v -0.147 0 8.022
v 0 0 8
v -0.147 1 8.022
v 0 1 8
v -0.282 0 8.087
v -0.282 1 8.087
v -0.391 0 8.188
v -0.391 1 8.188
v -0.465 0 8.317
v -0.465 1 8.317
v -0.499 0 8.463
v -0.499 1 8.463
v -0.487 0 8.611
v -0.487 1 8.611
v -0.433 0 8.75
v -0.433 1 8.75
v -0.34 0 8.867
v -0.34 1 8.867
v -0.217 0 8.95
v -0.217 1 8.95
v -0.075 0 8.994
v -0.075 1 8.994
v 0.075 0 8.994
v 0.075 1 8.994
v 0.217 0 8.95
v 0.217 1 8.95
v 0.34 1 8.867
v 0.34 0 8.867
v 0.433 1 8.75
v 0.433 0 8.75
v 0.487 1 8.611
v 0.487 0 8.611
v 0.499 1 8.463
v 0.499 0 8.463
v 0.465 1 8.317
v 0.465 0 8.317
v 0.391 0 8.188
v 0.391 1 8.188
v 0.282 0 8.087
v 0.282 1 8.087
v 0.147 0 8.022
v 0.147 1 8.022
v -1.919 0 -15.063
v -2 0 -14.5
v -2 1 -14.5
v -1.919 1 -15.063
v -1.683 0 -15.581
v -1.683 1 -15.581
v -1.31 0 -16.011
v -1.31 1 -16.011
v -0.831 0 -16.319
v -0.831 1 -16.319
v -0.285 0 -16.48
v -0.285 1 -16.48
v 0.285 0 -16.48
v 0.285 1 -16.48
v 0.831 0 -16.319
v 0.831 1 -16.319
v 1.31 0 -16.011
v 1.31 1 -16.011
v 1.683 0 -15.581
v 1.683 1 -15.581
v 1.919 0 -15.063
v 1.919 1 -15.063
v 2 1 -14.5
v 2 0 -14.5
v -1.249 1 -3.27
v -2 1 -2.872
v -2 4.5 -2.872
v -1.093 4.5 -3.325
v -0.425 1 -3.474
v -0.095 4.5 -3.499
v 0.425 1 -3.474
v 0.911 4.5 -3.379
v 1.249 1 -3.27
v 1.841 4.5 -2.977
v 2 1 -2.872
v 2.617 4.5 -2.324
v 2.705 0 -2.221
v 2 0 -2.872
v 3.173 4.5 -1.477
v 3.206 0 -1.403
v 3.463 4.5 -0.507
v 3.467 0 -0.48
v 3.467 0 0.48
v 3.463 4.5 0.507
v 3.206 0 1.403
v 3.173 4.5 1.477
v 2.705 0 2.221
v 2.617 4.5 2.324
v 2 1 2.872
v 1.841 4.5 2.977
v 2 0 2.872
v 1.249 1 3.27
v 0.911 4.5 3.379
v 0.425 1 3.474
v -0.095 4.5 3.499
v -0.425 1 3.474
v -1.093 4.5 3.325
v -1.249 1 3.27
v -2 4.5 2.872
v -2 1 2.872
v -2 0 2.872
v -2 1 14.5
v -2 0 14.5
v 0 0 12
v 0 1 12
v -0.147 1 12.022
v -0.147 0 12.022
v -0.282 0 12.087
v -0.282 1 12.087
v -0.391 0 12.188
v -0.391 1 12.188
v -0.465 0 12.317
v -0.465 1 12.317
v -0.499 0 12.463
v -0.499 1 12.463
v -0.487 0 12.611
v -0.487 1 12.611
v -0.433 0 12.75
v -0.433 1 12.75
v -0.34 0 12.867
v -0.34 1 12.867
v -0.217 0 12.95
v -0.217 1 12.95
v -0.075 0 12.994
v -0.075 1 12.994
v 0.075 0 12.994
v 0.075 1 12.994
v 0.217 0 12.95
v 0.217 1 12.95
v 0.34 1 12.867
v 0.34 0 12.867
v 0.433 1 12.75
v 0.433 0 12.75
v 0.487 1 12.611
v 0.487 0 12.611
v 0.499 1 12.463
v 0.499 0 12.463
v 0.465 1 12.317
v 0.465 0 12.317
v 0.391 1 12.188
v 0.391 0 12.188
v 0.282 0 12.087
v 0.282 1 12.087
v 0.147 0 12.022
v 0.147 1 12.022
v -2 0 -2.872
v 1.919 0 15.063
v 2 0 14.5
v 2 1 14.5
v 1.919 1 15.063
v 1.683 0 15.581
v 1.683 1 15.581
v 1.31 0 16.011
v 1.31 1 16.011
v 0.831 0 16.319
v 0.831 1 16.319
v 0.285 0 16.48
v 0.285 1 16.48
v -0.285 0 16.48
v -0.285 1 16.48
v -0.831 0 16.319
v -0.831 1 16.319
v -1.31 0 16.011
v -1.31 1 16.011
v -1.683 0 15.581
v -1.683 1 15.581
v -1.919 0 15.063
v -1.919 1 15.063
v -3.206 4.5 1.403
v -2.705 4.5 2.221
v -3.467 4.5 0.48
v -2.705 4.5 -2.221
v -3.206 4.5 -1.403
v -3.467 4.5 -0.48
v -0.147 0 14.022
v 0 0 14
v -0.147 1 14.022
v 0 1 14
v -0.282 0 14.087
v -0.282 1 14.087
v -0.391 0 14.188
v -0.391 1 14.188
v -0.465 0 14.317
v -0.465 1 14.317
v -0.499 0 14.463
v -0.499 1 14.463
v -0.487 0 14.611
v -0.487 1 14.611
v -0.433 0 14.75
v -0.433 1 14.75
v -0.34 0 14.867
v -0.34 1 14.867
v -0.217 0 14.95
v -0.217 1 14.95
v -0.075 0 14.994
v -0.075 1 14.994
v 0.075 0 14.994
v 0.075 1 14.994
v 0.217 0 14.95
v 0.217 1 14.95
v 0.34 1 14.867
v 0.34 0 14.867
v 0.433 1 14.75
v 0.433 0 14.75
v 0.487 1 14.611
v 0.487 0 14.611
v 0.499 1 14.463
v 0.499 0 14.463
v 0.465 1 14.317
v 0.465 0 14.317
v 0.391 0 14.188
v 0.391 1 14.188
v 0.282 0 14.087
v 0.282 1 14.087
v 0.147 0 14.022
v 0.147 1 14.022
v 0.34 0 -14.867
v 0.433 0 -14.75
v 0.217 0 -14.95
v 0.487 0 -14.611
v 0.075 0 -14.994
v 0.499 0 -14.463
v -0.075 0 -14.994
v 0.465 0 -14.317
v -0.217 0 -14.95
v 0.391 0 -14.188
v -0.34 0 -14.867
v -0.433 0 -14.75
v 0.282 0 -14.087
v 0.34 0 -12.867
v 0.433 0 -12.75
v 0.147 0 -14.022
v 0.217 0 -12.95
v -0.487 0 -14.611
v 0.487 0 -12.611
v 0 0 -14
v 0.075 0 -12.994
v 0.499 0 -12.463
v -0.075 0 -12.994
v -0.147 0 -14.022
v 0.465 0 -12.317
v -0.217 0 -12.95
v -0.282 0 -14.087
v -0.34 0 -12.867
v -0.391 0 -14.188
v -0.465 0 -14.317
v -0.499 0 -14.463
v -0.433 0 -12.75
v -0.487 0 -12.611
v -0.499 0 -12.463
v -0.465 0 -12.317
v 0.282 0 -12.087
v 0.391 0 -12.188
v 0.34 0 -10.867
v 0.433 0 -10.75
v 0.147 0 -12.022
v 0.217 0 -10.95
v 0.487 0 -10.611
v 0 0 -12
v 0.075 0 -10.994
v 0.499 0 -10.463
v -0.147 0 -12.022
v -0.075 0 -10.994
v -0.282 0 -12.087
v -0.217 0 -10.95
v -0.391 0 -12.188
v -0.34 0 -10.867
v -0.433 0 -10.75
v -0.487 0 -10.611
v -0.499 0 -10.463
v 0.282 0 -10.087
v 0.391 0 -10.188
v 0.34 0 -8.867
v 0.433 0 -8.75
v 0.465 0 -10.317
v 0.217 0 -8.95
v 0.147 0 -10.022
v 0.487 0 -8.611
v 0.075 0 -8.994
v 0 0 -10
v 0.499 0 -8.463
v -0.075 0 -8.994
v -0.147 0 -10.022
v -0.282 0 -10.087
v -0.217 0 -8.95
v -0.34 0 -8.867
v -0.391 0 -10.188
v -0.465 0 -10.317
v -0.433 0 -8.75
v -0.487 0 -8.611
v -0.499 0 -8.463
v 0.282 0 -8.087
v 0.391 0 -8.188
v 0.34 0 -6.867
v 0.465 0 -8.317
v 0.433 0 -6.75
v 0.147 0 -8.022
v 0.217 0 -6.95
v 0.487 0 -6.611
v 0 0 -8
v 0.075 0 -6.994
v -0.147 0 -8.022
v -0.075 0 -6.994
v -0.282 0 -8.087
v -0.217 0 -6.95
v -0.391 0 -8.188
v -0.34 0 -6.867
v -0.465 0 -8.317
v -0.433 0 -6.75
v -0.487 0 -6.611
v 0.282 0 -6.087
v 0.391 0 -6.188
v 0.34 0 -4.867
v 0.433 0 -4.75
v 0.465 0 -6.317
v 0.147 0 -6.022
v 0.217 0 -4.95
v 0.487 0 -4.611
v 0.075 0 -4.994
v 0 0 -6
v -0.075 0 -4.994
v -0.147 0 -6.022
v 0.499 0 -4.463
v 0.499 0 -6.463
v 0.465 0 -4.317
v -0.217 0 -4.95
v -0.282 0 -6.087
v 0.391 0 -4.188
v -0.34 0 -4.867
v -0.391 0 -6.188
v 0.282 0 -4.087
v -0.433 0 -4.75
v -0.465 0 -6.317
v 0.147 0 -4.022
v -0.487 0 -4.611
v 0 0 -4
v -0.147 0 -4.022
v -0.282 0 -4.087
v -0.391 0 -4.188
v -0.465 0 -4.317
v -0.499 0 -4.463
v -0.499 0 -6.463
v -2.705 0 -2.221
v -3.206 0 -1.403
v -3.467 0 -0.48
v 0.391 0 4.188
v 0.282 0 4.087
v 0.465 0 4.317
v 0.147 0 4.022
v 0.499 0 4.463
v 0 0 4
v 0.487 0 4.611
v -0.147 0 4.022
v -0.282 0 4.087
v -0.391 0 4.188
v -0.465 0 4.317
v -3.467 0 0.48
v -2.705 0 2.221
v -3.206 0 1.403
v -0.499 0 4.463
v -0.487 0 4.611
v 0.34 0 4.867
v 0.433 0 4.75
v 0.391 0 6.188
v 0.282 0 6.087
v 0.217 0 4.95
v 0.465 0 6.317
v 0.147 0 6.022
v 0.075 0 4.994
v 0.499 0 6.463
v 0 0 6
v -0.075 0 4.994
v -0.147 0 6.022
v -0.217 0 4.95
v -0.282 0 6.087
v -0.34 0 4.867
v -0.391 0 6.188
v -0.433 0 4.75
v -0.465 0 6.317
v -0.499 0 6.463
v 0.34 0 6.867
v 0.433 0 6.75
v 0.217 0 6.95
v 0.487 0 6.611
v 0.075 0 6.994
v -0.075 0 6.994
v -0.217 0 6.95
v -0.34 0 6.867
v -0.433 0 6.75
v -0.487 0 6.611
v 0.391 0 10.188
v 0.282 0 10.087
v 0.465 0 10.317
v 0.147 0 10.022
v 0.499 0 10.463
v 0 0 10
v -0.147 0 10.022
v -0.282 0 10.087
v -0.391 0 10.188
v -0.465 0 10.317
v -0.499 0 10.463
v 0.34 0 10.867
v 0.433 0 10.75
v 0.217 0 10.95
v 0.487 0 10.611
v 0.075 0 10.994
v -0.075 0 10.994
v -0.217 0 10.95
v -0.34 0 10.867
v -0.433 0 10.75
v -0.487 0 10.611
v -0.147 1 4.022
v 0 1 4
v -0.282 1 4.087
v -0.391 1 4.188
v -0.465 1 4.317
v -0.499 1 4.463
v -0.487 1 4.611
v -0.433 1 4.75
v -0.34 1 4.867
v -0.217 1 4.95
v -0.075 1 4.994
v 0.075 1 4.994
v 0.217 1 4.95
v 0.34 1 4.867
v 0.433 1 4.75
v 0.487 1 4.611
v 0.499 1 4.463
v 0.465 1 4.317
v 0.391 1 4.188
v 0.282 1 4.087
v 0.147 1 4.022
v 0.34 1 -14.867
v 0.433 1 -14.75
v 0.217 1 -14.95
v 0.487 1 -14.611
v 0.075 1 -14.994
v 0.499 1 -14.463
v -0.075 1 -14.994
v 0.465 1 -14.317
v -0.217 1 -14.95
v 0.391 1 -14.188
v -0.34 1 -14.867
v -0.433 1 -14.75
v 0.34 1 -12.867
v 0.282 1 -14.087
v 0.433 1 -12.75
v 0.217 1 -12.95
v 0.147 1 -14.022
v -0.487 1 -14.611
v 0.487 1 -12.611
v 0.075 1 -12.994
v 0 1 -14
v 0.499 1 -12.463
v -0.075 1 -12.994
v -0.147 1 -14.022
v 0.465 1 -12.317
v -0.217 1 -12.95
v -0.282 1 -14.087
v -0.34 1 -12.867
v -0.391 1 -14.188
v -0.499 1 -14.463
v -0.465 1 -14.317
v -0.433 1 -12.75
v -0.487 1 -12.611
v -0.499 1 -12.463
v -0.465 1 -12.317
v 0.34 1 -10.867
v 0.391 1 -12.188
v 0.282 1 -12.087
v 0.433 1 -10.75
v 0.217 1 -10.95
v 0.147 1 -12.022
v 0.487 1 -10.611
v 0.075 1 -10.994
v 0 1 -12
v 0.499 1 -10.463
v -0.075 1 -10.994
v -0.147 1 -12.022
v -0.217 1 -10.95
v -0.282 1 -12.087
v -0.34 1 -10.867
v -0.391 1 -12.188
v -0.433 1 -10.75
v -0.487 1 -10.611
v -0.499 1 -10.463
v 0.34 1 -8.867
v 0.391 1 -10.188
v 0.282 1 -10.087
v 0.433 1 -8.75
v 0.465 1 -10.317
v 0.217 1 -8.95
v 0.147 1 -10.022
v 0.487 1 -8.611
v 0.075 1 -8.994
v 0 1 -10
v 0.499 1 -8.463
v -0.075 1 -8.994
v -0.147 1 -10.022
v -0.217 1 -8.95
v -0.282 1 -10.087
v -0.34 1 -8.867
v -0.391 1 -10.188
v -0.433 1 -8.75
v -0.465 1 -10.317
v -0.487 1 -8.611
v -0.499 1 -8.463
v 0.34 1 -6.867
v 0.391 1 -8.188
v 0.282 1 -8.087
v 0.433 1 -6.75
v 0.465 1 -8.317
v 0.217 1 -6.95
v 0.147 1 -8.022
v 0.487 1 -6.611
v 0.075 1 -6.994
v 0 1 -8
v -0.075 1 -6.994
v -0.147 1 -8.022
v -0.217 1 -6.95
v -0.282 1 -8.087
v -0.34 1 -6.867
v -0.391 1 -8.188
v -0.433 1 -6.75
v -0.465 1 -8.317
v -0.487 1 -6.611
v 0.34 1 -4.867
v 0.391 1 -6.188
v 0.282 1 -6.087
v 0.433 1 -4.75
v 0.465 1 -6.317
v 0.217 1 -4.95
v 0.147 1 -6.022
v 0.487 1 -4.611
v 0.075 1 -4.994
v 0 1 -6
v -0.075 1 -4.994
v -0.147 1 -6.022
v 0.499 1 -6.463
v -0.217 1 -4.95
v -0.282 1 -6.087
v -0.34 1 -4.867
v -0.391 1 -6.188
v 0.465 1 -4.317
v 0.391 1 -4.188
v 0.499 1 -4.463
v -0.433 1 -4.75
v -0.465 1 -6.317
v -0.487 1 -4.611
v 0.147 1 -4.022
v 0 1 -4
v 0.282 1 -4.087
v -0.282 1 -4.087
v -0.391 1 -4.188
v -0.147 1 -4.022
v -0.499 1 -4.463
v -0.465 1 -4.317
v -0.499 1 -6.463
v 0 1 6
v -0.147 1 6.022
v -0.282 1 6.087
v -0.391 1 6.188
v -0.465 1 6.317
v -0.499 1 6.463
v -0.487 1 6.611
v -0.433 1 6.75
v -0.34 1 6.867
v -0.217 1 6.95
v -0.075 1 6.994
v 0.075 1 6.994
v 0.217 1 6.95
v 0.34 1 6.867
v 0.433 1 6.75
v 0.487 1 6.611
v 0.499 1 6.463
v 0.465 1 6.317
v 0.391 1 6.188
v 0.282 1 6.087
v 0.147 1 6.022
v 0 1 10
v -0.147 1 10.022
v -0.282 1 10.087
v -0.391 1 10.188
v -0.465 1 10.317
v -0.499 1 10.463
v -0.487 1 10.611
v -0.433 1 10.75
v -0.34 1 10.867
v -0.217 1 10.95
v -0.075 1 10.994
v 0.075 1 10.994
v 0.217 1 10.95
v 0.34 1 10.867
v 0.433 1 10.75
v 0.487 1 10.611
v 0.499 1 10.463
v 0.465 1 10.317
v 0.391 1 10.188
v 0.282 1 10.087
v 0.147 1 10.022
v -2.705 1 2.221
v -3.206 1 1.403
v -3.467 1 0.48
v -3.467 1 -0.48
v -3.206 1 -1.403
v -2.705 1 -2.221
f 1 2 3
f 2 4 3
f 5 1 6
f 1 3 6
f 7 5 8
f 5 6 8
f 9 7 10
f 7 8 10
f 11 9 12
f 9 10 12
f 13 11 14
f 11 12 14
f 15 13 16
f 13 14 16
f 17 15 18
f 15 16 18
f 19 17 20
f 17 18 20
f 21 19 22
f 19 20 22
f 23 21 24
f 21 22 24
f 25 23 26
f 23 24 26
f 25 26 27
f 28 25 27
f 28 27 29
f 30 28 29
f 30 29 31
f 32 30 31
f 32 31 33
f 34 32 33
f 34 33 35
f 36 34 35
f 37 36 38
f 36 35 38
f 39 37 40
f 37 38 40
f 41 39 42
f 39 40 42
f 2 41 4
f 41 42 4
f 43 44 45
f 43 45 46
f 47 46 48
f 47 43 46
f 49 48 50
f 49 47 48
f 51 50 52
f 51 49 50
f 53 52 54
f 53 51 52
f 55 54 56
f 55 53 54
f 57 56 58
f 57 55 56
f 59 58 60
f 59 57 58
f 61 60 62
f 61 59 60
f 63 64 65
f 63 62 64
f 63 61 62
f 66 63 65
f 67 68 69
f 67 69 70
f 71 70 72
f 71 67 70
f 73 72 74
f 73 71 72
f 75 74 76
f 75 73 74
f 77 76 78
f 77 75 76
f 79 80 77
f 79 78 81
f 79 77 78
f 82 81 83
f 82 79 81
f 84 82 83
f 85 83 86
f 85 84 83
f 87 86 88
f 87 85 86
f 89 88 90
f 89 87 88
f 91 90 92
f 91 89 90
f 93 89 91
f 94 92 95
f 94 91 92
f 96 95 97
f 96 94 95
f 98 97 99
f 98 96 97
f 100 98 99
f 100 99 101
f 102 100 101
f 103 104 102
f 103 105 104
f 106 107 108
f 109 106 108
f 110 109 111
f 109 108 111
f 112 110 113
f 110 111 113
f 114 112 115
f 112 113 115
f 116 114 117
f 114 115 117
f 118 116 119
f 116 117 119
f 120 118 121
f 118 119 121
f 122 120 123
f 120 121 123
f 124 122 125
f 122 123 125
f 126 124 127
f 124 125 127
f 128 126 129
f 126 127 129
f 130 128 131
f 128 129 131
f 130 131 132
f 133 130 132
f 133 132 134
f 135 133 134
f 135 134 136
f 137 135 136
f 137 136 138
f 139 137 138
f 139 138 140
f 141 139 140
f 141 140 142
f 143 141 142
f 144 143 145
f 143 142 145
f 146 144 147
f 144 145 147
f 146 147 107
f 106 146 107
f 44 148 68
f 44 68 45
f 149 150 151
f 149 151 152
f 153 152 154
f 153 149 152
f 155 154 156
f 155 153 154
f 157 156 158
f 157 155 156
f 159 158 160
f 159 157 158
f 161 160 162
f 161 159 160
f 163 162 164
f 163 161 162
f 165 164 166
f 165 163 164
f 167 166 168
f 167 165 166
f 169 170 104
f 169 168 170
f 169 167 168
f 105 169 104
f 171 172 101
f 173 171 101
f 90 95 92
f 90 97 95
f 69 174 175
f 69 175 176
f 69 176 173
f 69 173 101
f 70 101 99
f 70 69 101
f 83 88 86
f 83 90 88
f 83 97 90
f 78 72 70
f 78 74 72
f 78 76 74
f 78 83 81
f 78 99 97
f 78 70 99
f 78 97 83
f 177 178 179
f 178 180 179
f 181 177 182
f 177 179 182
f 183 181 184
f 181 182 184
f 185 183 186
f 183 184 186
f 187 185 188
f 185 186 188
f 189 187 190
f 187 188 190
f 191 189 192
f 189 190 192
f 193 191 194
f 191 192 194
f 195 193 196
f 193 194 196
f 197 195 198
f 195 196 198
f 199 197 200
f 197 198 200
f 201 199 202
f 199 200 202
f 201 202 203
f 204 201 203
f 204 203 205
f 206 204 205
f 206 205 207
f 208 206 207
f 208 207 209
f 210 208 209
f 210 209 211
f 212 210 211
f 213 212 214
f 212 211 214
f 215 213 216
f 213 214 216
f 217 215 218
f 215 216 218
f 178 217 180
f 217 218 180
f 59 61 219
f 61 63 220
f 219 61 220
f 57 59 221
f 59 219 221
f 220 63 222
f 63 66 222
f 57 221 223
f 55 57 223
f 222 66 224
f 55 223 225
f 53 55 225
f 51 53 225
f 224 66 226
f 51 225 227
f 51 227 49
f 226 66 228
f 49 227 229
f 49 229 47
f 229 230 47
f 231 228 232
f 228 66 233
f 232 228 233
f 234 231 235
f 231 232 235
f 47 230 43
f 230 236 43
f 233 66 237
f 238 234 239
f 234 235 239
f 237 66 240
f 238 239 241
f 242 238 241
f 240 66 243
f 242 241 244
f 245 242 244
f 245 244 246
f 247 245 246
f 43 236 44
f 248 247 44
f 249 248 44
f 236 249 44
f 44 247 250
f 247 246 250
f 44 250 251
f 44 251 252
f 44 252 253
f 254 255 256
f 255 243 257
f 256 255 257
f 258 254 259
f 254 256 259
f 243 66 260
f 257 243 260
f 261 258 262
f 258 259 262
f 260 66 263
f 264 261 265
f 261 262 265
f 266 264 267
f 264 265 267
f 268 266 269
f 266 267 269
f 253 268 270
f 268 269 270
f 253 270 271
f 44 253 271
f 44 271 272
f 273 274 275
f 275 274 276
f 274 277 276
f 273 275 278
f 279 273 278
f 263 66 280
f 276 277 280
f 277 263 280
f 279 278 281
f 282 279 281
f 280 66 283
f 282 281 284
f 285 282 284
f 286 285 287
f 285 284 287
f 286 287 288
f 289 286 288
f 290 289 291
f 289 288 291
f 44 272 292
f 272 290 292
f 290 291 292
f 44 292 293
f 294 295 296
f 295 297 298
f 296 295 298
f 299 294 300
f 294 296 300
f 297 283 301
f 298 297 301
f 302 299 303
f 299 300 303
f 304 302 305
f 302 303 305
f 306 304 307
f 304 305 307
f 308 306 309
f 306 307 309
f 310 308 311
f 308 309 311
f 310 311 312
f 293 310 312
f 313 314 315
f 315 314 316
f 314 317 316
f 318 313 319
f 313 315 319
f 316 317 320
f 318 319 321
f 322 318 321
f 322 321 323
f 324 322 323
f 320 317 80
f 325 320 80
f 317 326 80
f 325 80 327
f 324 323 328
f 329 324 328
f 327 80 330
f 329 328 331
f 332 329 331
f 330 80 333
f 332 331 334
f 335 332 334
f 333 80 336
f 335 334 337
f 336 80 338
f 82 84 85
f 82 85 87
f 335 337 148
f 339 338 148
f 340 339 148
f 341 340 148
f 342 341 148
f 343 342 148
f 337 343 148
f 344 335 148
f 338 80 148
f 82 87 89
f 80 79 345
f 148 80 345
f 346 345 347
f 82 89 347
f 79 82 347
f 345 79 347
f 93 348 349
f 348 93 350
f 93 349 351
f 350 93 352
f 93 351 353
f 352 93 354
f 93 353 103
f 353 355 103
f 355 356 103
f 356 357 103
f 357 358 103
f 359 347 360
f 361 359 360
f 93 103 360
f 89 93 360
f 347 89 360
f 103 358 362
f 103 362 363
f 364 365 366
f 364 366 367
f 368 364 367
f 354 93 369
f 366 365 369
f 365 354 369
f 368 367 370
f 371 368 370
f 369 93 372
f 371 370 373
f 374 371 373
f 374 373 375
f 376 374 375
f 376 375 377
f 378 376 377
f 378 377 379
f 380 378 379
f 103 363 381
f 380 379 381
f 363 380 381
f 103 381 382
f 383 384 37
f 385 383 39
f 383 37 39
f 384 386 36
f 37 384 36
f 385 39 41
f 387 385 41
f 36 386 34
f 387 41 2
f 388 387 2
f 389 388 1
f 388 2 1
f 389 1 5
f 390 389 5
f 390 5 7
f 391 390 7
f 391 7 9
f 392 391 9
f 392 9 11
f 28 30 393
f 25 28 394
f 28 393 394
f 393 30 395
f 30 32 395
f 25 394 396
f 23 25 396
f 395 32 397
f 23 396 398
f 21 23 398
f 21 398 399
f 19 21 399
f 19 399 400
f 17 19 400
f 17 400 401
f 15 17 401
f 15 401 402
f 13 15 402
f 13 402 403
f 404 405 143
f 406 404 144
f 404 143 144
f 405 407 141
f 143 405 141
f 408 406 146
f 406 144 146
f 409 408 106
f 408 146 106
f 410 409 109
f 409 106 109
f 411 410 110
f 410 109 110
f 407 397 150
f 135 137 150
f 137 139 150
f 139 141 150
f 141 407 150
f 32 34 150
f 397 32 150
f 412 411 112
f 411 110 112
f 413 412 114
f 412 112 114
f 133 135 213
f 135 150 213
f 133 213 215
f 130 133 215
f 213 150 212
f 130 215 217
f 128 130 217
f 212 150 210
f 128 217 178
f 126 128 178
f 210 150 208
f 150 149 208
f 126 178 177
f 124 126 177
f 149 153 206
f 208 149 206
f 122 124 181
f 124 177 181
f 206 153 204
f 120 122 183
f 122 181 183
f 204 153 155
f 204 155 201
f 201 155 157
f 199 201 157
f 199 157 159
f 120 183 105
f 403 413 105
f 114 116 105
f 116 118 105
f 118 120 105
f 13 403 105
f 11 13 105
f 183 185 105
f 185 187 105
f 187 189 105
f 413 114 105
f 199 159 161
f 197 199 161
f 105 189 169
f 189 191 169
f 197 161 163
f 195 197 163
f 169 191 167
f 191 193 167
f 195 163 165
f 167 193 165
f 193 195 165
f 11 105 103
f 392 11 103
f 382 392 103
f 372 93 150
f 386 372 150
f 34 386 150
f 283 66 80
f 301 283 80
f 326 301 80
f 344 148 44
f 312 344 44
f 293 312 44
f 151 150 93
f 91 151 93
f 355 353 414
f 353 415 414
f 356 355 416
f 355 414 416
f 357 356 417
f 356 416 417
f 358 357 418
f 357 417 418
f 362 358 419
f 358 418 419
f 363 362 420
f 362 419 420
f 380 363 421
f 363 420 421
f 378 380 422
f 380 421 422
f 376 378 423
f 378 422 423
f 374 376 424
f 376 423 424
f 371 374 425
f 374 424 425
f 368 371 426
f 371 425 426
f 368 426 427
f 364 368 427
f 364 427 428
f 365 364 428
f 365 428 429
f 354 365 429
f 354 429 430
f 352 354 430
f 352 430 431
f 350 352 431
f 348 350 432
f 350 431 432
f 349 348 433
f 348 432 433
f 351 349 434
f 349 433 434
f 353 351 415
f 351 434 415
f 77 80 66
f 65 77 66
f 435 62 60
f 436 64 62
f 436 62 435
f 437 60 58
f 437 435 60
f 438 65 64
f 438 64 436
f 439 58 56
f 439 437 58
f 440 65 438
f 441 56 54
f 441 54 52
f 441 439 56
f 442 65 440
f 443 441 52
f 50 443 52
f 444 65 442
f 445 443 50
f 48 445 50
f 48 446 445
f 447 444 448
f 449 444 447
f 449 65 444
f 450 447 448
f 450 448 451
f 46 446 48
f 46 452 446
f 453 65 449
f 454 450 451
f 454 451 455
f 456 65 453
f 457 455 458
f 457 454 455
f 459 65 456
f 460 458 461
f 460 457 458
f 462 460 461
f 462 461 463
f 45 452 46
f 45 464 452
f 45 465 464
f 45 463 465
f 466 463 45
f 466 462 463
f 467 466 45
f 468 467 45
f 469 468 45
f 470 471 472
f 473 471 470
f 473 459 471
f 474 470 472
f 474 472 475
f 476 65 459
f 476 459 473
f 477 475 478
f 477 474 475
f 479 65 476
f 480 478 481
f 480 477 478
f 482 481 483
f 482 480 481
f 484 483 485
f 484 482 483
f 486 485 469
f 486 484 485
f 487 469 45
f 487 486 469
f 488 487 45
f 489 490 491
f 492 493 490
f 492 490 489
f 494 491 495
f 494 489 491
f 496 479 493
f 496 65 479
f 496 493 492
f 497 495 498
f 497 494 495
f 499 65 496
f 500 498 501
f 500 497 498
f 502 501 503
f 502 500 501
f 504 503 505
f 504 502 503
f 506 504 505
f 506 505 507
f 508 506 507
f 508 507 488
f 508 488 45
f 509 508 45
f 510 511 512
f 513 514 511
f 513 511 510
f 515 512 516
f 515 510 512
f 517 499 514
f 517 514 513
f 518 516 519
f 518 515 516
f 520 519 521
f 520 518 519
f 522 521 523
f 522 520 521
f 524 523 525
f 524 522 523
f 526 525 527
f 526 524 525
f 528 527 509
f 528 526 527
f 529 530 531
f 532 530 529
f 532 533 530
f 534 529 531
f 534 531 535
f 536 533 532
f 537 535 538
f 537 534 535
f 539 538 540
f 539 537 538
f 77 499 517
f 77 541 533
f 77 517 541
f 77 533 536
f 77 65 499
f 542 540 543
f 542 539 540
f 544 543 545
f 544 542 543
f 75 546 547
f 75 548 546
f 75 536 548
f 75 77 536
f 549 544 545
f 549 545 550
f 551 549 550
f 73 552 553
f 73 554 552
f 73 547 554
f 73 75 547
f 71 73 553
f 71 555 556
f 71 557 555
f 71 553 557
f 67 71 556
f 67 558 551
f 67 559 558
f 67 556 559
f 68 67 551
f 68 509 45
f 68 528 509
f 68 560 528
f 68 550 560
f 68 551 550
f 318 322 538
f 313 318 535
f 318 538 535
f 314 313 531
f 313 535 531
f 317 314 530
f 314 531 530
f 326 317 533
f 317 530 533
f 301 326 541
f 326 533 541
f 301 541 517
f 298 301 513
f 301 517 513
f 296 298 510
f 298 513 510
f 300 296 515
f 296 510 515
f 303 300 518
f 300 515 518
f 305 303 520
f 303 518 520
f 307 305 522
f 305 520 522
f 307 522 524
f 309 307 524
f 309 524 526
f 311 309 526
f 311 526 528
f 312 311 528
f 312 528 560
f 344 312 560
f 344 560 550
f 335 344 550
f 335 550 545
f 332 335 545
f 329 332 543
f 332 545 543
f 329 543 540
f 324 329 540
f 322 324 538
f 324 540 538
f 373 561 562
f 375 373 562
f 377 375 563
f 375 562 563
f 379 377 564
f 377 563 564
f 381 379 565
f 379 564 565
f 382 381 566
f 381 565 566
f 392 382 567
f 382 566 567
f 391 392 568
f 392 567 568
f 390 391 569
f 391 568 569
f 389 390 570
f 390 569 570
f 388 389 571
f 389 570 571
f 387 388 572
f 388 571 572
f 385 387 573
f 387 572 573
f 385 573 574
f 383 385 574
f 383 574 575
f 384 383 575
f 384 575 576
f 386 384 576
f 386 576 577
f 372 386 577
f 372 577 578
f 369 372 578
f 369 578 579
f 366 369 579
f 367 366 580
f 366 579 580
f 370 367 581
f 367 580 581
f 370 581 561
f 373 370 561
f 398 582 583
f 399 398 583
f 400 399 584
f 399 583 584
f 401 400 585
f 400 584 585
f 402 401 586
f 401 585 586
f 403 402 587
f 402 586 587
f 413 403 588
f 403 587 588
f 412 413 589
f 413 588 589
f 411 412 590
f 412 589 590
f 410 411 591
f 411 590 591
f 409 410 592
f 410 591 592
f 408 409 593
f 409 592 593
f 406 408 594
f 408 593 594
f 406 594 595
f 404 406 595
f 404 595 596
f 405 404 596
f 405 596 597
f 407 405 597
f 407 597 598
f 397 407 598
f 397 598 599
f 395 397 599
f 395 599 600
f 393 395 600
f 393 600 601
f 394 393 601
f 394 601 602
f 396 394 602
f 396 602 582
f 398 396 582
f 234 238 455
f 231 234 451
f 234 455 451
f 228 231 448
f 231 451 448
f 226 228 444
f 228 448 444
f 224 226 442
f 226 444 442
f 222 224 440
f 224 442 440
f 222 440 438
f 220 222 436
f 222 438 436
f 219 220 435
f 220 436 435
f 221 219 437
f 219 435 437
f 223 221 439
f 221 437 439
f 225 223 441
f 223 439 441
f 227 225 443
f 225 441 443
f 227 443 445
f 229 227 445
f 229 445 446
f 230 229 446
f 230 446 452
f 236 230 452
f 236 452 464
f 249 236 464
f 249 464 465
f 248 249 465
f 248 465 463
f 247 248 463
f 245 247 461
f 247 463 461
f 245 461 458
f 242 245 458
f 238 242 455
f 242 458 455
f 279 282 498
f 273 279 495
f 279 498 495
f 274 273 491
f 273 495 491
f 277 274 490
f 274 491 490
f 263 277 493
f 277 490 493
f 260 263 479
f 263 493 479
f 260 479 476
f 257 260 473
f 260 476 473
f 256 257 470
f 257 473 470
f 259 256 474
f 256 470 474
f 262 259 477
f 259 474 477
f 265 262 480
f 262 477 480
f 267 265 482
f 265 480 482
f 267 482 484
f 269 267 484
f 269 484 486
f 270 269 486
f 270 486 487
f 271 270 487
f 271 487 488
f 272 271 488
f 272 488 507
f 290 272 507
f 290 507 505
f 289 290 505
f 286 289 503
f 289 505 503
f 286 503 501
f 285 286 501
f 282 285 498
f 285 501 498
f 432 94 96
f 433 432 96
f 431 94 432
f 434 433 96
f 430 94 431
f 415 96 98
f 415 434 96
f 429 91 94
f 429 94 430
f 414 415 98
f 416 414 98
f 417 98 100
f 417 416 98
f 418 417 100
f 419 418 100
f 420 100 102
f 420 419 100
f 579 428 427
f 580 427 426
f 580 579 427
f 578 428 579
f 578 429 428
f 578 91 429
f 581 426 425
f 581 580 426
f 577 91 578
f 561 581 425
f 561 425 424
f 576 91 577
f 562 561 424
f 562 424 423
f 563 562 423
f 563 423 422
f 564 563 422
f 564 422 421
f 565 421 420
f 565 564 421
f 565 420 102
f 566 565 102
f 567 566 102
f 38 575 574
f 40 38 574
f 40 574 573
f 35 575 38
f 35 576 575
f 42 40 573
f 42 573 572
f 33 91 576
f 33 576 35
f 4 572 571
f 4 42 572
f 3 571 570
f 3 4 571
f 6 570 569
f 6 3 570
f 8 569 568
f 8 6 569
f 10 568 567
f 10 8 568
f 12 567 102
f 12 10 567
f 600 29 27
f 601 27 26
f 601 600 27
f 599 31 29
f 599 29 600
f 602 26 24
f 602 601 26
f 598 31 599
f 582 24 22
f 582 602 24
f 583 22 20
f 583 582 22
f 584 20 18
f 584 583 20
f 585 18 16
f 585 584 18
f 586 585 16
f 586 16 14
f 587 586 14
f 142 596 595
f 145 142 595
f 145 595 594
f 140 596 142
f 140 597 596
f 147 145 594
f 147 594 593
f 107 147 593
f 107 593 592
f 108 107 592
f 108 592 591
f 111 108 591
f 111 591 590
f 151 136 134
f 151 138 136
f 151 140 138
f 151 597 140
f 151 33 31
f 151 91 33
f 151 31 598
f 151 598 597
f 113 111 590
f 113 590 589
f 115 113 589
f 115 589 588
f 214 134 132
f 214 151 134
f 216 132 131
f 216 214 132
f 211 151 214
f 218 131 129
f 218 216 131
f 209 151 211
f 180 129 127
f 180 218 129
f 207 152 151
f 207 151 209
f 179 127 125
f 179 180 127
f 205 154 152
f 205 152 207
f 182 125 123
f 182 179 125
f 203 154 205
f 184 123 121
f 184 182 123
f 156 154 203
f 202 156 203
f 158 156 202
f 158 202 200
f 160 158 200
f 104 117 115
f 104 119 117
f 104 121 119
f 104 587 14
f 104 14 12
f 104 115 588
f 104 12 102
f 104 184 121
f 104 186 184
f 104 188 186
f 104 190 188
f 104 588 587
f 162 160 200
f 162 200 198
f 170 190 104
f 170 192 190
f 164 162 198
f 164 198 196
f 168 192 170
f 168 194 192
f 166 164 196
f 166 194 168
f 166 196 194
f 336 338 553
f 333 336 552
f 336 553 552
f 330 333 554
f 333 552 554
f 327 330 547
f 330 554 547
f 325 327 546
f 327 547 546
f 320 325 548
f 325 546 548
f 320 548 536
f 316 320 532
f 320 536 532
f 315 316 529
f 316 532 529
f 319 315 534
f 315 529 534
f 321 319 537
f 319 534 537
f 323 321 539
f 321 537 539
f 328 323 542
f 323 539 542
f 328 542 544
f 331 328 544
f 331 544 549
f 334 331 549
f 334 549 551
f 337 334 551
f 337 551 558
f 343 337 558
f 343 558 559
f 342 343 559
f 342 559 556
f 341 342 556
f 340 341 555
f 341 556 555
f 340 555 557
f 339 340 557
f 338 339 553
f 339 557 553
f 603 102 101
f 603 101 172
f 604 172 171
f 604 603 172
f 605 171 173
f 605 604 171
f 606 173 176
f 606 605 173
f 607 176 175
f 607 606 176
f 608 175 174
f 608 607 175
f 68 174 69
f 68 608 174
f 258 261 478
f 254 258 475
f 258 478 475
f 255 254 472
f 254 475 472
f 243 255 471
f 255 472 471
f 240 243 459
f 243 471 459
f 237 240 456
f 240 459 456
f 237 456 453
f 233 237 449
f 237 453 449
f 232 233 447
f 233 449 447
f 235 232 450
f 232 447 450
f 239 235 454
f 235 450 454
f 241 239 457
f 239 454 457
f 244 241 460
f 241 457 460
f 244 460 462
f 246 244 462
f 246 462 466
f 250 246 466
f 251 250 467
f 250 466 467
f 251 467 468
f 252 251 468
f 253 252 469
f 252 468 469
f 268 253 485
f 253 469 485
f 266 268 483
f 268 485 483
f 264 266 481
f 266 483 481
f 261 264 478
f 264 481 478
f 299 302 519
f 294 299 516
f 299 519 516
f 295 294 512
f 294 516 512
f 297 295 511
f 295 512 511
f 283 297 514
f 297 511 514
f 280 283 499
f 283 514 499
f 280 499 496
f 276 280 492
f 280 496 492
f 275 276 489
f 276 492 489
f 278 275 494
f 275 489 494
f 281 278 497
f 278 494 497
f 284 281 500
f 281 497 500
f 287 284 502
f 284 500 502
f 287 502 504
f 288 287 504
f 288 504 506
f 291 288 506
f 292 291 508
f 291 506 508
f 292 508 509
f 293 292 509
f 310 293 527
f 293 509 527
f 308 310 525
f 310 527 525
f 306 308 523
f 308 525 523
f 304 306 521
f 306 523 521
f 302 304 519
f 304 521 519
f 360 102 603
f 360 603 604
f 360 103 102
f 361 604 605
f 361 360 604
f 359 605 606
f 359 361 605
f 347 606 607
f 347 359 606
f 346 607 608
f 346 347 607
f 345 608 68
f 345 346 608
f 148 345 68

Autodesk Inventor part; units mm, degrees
ref_plane "YZ Plane" through (0, 0, 0) normal (1, 0, 0) x (0, 1, 0)
ref_plane "XZ Plane" through (0, 0, 0) normal (0, 1, 0) x (-1, 0, 0)
ref_plane "XY Plane" through (0, 0, 0) normal (0, 0, 1) x (1, 0, 0)
sketch "スケッチ1" plane through (0, 0, 0) normal (0, 1, 0) x (-1, 0, 0)
  circle A0 centre (0, 0) radius 3.5
  circle A1 centre (0, 14.5) radius 2
  circle A2 centre (0, -14.5) radius 2
  line L0 (2, 14.5) -> (2, 2.8723)
  line L1 (-2, 14.5) -> (-2, 2.8723)
  line L2 (-2, -2.8723) -> (-2, -14.5)
  line L3 (2, -2.8723) -> (2, -14.5)
  dimension "d0" = 7
  dimension "d2" = 4
  dimension "d3" = 14.5
  dimension "d4" = 14.5
extrude "押し出し1" add sketch "スケッチ1" along normal blind 1
sketch "スケッチ2" plane through (0, 1, 0) normal (0, 1, 0) x (1, 0, 0)
  arc A0 (-2, 2.8723) -> (-2, -2.8723) centre (0, 0) ccw projected
  circle A1 centre (0, 0) radius 3.5 projected
extrude "押し出し2" add sketch "スケッチ2" along normal blind 3.5
sketch "スケッチ3" plane through (0, 0, 0) normal (0, -1, 0) x (1, 0, 0)
  arc A0 (2, 14.5) -> (-2, 14.5) centre (0, 14.5) ccw projected
  point P0 (0, 12.5)
  point P1 (0, 10.5)
  point P2 (0, 8.5)
  point P3 (0, 6.5)
  point P4 (0, 4.5)
  dimension "d9" = 2
  dimension "d18" = 2
  dimension "d19" = 2
  dimension "d20" = 2
  dimension "d21" = 2
hole "穴1" at (0, 0, 14.5) at (0, 0, 12.5) at (0, 0, 10.5) at (0, 0, 8.5) at (0, 0, 6.5) at (0, 0, 4.5) direction (0, 1, 0) diameter 1 end through all
mirror "ミラー1" about plane through (0, 0, 0) normal (0, 0, 1) of "穴1"
equation "\"d4\" = d3"
equation "\"d18\" = d9"
equation "\"d19\" = d9"
equation "\"d20\" = d9"
equation "\"d21\" = d9"
properties part number "horn_10g"
